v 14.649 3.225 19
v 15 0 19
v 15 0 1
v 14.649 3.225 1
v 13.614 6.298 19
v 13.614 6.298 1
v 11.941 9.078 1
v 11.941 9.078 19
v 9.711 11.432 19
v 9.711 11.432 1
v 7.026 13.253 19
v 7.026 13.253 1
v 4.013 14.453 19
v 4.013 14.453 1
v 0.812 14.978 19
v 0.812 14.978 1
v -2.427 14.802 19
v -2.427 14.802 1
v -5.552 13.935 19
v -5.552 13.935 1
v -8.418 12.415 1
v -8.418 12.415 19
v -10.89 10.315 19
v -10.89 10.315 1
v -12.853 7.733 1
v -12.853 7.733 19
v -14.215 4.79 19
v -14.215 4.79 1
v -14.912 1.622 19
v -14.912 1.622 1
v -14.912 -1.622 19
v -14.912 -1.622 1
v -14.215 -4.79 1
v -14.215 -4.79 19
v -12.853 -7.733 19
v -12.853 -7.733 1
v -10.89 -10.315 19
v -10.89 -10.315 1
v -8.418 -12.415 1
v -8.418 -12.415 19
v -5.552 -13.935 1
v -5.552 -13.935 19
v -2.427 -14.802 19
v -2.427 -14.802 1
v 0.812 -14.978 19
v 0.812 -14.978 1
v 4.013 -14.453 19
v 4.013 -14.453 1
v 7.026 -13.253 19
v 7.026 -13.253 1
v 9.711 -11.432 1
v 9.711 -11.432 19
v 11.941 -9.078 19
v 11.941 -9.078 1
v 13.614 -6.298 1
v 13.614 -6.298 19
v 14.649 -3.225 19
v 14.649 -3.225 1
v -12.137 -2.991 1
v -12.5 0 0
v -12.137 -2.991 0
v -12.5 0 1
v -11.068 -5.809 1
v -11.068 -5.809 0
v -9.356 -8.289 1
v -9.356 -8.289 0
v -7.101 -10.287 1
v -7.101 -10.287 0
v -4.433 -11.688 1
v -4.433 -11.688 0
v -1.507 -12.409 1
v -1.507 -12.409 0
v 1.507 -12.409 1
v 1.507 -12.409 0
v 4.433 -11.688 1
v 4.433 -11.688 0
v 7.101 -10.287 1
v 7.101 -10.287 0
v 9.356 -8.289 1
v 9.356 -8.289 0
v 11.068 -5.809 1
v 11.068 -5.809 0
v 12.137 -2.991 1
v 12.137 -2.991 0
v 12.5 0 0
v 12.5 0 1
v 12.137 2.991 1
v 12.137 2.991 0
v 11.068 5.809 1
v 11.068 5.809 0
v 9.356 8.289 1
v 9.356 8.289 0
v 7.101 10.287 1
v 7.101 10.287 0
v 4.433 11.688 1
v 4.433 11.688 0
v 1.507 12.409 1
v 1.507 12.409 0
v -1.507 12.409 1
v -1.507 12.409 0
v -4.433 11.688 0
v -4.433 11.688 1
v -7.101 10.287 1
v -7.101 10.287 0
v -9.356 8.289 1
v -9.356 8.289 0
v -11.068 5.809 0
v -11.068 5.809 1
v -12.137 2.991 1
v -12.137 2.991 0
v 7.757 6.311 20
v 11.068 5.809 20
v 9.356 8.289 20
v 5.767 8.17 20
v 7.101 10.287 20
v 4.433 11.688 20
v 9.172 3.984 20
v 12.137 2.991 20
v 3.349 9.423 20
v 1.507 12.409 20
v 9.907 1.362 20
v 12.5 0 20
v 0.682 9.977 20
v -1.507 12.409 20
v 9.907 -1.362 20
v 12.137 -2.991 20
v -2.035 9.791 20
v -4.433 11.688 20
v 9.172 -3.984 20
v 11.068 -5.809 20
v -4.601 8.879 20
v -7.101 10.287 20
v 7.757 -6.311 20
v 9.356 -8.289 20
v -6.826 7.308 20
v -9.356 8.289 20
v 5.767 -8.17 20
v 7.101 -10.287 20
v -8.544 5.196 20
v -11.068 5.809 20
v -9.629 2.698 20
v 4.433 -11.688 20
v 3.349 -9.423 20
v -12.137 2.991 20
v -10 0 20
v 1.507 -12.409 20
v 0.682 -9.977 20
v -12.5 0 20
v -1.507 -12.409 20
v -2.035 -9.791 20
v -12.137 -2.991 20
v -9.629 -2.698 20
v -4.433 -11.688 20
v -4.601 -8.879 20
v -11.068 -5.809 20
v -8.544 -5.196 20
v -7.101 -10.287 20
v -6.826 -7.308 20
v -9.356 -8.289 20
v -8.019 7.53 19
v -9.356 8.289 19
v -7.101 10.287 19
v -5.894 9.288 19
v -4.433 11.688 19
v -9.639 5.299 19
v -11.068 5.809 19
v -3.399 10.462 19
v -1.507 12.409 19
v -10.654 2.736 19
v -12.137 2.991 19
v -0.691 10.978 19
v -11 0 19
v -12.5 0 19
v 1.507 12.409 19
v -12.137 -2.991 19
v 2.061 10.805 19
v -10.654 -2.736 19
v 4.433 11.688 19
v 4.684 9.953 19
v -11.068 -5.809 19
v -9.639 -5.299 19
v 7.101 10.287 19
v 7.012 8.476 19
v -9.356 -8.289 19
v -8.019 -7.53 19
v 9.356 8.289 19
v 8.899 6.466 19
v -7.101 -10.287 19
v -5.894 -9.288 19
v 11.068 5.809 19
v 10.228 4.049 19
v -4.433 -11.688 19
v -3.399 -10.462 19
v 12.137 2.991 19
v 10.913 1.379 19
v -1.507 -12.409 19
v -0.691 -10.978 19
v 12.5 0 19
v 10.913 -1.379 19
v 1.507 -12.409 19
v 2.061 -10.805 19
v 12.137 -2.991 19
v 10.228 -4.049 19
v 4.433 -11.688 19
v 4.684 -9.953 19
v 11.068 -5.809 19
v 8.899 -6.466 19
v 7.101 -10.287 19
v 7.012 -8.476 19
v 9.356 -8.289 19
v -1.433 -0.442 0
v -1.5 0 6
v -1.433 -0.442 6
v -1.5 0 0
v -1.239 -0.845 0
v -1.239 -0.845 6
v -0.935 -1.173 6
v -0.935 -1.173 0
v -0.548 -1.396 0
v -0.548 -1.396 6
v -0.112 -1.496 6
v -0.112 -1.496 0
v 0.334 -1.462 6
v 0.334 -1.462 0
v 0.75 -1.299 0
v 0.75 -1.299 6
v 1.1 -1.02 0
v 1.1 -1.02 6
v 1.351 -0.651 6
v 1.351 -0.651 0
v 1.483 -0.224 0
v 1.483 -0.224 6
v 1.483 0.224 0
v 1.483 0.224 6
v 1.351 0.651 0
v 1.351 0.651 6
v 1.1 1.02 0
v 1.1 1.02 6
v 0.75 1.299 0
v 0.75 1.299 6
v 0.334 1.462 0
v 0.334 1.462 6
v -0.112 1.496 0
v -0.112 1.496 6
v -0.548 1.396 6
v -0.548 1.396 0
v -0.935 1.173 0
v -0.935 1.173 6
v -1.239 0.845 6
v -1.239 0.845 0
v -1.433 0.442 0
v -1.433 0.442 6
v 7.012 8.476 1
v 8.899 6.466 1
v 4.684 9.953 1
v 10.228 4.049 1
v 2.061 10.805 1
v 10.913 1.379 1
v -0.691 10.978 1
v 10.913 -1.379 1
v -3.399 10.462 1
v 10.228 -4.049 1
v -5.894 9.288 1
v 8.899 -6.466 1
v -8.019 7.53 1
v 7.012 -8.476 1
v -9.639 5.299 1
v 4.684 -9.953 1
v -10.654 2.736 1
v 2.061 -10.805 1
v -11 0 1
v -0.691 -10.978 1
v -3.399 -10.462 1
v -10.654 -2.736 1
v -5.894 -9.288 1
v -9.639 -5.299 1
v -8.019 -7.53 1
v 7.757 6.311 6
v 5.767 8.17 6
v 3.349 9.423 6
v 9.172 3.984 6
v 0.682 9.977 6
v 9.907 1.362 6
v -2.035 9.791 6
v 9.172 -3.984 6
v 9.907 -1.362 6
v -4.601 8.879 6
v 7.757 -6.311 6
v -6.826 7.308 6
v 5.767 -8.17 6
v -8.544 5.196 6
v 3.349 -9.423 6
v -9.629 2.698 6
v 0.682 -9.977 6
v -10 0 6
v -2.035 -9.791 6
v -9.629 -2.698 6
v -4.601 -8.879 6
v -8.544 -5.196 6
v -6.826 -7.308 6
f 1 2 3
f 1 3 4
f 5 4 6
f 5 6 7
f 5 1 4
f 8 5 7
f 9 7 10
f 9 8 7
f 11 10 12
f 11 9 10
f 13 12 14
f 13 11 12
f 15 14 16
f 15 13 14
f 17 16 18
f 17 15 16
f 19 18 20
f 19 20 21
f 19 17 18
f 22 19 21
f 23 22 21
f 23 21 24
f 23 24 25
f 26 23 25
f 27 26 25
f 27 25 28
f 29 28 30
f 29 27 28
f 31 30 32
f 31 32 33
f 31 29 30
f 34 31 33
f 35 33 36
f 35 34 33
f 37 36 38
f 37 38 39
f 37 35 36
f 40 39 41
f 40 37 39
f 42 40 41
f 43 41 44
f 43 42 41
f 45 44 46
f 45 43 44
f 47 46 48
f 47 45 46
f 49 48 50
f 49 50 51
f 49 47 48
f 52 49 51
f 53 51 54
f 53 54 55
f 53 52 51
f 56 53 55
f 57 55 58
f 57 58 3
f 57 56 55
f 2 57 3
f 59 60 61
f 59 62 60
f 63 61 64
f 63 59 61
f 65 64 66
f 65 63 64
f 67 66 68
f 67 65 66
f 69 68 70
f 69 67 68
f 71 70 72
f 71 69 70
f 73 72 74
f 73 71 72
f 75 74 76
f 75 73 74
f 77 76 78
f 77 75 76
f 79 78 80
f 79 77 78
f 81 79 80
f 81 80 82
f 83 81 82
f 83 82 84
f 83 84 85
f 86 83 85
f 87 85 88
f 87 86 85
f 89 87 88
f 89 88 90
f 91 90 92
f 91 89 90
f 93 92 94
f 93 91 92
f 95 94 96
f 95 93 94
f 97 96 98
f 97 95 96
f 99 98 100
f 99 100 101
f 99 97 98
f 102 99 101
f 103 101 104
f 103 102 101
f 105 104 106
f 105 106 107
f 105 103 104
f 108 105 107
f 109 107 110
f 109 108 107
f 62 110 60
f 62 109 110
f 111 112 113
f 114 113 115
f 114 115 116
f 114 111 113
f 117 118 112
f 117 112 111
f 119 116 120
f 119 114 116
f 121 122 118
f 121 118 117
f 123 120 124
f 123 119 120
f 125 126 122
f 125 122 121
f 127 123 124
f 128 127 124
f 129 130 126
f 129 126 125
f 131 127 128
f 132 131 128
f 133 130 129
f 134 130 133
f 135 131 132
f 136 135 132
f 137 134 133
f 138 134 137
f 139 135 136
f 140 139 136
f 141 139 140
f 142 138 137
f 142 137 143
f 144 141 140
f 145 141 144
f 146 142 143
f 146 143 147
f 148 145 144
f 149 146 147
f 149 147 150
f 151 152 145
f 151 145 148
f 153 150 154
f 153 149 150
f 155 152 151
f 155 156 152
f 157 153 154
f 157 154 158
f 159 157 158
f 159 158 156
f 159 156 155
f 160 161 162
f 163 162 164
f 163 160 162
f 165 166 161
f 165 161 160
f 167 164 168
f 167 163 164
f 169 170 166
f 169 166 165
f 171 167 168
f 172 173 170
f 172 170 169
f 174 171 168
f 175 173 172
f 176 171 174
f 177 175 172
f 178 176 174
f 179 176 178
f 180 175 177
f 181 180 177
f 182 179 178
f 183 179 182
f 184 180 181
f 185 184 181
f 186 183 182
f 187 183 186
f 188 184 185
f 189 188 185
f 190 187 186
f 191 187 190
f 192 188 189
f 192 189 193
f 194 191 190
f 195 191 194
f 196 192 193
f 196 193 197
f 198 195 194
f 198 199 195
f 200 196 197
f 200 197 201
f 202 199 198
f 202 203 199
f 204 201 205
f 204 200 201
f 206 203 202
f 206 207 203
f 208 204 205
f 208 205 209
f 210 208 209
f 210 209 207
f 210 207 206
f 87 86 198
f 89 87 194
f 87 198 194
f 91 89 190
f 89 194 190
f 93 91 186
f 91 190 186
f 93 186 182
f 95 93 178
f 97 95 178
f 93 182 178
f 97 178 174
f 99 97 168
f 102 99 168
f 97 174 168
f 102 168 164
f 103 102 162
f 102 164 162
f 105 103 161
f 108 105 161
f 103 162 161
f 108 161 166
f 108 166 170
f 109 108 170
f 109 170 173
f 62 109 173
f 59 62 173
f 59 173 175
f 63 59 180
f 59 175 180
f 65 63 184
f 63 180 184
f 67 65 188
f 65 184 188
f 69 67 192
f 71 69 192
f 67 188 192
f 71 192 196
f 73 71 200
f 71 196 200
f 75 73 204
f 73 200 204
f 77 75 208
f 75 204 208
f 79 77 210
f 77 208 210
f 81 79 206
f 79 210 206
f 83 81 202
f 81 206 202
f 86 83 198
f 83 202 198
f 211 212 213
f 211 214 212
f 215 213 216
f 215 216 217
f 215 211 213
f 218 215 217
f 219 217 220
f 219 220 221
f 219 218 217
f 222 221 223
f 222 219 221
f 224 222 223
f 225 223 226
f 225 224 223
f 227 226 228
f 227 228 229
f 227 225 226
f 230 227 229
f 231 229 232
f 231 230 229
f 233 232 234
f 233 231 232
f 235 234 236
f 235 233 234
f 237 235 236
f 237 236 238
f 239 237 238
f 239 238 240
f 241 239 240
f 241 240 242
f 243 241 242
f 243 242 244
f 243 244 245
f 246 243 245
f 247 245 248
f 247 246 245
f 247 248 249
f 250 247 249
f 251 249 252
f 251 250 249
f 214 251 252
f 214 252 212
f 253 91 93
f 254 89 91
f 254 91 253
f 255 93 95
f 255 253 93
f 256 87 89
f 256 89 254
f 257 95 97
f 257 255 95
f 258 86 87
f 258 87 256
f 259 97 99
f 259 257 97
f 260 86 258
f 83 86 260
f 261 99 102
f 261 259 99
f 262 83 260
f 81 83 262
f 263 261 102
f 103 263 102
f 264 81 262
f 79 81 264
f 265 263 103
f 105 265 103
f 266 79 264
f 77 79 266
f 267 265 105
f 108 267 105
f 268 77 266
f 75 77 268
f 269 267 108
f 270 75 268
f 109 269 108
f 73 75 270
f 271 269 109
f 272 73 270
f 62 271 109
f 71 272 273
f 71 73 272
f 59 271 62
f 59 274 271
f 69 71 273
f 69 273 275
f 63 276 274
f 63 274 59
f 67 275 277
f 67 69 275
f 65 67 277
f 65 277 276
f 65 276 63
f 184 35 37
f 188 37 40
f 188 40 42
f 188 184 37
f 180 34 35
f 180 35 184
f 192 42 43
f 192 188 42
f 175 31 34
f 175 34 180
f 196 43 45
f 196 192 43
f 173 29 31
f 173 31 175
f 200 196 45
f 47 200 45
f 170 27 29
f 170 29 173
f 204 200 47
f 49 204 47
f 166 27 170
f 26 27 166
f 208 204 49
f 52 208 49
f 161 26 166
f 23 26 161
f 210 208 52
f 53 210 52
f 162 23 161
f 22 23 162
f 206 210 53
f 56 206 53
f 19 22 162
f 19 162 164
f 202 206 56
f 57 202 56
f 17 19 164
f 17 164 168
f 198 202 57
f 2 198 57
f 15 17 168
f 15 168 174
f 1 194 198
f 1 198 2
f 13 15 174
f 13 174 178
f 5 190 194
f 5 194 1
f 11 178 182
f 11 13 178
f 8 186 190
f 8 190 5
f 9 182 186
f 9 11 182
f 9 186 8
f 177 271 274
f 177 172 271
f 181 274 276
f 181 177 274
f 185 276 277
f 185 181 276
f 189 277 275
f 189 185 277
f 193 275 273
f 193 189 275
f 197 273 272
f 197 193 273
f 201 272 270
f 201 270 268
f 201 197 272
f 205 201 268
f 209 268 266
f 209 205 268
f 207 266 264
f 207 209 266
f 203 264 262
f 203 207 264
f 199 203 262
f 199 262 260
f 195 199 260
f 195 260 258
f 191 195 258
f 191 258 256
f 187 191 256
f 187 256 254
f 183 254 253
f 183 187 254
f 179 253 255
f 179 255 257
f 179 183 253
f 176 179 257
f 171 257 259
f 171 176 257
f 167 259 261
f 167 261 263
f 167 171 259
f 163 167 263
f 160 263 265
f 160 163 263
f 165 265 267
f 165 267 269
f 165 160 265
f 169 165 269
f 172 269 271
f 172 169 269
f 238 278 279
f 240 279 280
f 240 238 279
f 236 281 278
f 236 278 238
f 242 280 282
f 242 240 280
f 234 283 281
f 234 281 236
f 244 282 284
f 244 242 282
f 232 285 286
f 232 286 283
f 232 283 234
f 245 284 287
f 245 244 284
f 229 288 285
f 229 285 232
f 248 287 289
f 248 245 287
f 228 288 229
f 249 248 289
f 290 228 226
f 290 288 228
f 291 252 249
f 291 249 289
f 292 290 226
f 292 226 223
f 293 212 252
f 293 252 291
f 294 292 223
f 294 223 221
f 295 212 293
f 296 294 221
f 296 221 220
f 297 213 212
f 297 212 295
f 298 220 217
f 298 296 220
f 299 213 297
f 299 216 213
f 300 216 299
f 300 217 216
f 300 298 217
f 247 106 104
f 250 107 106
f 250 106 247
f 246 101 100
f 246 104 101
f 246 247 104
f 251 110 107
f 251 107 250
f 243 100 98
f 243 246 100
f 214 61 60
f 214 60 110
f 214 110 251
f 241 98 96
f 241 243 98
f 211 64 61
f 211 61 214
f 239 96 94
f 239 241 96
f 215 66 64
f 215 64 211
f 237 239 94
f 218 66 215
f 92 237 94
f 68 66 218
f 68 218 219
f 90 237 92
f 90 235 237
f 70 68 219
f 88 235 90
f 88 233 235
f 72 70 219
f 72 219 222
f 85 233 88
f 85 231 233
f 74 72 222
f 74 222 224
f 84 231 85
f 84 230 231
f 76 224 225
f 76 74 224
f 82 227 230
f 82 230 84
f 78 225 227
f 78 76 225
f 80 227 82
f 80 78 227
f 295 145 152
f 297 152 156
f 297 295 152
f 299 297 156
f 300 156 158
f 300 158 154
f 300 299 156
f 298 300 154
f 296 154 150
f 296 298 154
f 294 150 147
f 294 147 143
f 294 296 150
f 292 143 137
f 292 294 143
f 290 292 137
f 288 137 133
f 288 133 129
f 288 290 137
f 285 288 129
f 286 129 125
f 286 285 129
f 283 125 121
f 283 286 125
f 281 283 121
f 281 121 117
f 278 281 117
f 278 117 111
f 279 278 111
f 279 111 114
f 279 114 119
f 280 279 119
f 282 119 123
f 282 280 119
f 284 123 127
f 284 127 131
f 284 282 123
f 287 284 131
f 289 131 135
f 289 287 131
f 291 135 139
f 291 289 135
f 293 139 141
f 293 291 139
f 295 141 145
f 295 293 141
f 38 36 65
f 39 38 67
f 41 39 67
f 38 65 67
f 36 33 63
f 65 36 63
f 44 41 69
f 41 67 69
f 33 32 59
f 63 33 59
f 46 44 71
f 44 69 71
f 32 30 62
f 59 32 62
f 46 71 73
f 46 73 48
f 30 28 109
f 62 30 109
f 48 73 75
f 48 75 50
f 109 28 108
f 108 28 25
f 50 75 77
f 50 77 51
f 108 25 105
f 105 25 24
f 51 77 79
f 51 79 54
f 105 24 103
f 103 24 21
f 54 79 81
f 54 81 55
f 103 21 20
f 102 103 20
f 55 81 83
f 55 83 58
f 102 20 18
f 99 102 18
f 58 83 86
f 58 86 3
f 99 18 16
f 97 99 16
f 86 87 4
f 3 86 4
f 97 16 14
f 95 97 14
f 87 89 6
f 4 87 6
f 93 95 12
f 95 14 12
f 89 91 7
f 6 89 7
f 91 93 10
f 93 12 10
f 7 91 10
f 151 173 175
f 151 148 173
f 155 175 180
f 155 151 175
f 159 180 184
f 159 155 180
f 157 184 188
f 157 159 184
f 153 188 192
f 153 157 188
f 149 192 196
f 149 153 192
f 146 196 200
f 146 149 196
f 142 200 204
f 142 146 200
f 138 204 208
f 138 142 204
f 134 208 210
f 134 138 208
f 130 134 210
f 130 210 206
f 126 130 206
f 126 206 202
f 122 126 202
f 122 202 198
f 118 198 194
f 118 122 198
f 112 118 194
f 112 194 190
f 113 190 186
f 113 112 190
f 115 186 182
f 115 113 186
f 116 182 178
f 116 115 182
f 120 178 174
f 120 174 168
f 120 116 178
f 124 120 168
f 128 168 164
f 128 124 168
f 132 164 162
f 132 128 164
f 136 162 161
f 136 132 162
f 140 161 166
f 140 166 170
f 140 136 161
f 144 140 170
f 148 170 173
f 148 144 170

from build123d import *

# Parameters (mm, degrees)
SALIENTE_EXTRUIR1_START = 18
CROQUIS2_R              = 15
CROQUIS2_R_2            = 12.5
SALIENTE_EXTRUIR1_DEPTH = 18


with BuildPart() as part:
    # Croquis1 → Revolución1 (revolve)
    with BuildSketch(Plane(origin=(0, 0, 0), x_dir=(0, 0, -1), z_dir=(1, 0, 0)), mode=Mode.PRIVATE) as revoluci_n1_sk:
        Polygon((0, -1.5), (0, -12.5), (-1, -12.5), (-1, -11), (-19, -11), (-19, -12.5), (-20, -12.5), (-20, -10), (-6, -10), (-6, -1.5), align=None)
    revolve(revoluci_n1_sk.sketch.rotate(Axis((0, 0, 0), (0, 0, 1)), 270), axis=Axis((0, 0, 0), (0, 0, 1)))


with BuildPart() as body_2:
    # Croquis2 → Saliente-Extruir1 (new body)
    with BuildSketch(Plane.XY.offset(1).offset(SALIENTE_EXTRUIR1_START)):
        Circle(CROQUIS2_R)
        Circle(CROQUIS2_R_2, mode=Mode.SUBTRACT)
    extrude(amount=-SALIENTE_EXTRUIR1_DEPTH)


solid = Compound([part.part, body_2.part])
